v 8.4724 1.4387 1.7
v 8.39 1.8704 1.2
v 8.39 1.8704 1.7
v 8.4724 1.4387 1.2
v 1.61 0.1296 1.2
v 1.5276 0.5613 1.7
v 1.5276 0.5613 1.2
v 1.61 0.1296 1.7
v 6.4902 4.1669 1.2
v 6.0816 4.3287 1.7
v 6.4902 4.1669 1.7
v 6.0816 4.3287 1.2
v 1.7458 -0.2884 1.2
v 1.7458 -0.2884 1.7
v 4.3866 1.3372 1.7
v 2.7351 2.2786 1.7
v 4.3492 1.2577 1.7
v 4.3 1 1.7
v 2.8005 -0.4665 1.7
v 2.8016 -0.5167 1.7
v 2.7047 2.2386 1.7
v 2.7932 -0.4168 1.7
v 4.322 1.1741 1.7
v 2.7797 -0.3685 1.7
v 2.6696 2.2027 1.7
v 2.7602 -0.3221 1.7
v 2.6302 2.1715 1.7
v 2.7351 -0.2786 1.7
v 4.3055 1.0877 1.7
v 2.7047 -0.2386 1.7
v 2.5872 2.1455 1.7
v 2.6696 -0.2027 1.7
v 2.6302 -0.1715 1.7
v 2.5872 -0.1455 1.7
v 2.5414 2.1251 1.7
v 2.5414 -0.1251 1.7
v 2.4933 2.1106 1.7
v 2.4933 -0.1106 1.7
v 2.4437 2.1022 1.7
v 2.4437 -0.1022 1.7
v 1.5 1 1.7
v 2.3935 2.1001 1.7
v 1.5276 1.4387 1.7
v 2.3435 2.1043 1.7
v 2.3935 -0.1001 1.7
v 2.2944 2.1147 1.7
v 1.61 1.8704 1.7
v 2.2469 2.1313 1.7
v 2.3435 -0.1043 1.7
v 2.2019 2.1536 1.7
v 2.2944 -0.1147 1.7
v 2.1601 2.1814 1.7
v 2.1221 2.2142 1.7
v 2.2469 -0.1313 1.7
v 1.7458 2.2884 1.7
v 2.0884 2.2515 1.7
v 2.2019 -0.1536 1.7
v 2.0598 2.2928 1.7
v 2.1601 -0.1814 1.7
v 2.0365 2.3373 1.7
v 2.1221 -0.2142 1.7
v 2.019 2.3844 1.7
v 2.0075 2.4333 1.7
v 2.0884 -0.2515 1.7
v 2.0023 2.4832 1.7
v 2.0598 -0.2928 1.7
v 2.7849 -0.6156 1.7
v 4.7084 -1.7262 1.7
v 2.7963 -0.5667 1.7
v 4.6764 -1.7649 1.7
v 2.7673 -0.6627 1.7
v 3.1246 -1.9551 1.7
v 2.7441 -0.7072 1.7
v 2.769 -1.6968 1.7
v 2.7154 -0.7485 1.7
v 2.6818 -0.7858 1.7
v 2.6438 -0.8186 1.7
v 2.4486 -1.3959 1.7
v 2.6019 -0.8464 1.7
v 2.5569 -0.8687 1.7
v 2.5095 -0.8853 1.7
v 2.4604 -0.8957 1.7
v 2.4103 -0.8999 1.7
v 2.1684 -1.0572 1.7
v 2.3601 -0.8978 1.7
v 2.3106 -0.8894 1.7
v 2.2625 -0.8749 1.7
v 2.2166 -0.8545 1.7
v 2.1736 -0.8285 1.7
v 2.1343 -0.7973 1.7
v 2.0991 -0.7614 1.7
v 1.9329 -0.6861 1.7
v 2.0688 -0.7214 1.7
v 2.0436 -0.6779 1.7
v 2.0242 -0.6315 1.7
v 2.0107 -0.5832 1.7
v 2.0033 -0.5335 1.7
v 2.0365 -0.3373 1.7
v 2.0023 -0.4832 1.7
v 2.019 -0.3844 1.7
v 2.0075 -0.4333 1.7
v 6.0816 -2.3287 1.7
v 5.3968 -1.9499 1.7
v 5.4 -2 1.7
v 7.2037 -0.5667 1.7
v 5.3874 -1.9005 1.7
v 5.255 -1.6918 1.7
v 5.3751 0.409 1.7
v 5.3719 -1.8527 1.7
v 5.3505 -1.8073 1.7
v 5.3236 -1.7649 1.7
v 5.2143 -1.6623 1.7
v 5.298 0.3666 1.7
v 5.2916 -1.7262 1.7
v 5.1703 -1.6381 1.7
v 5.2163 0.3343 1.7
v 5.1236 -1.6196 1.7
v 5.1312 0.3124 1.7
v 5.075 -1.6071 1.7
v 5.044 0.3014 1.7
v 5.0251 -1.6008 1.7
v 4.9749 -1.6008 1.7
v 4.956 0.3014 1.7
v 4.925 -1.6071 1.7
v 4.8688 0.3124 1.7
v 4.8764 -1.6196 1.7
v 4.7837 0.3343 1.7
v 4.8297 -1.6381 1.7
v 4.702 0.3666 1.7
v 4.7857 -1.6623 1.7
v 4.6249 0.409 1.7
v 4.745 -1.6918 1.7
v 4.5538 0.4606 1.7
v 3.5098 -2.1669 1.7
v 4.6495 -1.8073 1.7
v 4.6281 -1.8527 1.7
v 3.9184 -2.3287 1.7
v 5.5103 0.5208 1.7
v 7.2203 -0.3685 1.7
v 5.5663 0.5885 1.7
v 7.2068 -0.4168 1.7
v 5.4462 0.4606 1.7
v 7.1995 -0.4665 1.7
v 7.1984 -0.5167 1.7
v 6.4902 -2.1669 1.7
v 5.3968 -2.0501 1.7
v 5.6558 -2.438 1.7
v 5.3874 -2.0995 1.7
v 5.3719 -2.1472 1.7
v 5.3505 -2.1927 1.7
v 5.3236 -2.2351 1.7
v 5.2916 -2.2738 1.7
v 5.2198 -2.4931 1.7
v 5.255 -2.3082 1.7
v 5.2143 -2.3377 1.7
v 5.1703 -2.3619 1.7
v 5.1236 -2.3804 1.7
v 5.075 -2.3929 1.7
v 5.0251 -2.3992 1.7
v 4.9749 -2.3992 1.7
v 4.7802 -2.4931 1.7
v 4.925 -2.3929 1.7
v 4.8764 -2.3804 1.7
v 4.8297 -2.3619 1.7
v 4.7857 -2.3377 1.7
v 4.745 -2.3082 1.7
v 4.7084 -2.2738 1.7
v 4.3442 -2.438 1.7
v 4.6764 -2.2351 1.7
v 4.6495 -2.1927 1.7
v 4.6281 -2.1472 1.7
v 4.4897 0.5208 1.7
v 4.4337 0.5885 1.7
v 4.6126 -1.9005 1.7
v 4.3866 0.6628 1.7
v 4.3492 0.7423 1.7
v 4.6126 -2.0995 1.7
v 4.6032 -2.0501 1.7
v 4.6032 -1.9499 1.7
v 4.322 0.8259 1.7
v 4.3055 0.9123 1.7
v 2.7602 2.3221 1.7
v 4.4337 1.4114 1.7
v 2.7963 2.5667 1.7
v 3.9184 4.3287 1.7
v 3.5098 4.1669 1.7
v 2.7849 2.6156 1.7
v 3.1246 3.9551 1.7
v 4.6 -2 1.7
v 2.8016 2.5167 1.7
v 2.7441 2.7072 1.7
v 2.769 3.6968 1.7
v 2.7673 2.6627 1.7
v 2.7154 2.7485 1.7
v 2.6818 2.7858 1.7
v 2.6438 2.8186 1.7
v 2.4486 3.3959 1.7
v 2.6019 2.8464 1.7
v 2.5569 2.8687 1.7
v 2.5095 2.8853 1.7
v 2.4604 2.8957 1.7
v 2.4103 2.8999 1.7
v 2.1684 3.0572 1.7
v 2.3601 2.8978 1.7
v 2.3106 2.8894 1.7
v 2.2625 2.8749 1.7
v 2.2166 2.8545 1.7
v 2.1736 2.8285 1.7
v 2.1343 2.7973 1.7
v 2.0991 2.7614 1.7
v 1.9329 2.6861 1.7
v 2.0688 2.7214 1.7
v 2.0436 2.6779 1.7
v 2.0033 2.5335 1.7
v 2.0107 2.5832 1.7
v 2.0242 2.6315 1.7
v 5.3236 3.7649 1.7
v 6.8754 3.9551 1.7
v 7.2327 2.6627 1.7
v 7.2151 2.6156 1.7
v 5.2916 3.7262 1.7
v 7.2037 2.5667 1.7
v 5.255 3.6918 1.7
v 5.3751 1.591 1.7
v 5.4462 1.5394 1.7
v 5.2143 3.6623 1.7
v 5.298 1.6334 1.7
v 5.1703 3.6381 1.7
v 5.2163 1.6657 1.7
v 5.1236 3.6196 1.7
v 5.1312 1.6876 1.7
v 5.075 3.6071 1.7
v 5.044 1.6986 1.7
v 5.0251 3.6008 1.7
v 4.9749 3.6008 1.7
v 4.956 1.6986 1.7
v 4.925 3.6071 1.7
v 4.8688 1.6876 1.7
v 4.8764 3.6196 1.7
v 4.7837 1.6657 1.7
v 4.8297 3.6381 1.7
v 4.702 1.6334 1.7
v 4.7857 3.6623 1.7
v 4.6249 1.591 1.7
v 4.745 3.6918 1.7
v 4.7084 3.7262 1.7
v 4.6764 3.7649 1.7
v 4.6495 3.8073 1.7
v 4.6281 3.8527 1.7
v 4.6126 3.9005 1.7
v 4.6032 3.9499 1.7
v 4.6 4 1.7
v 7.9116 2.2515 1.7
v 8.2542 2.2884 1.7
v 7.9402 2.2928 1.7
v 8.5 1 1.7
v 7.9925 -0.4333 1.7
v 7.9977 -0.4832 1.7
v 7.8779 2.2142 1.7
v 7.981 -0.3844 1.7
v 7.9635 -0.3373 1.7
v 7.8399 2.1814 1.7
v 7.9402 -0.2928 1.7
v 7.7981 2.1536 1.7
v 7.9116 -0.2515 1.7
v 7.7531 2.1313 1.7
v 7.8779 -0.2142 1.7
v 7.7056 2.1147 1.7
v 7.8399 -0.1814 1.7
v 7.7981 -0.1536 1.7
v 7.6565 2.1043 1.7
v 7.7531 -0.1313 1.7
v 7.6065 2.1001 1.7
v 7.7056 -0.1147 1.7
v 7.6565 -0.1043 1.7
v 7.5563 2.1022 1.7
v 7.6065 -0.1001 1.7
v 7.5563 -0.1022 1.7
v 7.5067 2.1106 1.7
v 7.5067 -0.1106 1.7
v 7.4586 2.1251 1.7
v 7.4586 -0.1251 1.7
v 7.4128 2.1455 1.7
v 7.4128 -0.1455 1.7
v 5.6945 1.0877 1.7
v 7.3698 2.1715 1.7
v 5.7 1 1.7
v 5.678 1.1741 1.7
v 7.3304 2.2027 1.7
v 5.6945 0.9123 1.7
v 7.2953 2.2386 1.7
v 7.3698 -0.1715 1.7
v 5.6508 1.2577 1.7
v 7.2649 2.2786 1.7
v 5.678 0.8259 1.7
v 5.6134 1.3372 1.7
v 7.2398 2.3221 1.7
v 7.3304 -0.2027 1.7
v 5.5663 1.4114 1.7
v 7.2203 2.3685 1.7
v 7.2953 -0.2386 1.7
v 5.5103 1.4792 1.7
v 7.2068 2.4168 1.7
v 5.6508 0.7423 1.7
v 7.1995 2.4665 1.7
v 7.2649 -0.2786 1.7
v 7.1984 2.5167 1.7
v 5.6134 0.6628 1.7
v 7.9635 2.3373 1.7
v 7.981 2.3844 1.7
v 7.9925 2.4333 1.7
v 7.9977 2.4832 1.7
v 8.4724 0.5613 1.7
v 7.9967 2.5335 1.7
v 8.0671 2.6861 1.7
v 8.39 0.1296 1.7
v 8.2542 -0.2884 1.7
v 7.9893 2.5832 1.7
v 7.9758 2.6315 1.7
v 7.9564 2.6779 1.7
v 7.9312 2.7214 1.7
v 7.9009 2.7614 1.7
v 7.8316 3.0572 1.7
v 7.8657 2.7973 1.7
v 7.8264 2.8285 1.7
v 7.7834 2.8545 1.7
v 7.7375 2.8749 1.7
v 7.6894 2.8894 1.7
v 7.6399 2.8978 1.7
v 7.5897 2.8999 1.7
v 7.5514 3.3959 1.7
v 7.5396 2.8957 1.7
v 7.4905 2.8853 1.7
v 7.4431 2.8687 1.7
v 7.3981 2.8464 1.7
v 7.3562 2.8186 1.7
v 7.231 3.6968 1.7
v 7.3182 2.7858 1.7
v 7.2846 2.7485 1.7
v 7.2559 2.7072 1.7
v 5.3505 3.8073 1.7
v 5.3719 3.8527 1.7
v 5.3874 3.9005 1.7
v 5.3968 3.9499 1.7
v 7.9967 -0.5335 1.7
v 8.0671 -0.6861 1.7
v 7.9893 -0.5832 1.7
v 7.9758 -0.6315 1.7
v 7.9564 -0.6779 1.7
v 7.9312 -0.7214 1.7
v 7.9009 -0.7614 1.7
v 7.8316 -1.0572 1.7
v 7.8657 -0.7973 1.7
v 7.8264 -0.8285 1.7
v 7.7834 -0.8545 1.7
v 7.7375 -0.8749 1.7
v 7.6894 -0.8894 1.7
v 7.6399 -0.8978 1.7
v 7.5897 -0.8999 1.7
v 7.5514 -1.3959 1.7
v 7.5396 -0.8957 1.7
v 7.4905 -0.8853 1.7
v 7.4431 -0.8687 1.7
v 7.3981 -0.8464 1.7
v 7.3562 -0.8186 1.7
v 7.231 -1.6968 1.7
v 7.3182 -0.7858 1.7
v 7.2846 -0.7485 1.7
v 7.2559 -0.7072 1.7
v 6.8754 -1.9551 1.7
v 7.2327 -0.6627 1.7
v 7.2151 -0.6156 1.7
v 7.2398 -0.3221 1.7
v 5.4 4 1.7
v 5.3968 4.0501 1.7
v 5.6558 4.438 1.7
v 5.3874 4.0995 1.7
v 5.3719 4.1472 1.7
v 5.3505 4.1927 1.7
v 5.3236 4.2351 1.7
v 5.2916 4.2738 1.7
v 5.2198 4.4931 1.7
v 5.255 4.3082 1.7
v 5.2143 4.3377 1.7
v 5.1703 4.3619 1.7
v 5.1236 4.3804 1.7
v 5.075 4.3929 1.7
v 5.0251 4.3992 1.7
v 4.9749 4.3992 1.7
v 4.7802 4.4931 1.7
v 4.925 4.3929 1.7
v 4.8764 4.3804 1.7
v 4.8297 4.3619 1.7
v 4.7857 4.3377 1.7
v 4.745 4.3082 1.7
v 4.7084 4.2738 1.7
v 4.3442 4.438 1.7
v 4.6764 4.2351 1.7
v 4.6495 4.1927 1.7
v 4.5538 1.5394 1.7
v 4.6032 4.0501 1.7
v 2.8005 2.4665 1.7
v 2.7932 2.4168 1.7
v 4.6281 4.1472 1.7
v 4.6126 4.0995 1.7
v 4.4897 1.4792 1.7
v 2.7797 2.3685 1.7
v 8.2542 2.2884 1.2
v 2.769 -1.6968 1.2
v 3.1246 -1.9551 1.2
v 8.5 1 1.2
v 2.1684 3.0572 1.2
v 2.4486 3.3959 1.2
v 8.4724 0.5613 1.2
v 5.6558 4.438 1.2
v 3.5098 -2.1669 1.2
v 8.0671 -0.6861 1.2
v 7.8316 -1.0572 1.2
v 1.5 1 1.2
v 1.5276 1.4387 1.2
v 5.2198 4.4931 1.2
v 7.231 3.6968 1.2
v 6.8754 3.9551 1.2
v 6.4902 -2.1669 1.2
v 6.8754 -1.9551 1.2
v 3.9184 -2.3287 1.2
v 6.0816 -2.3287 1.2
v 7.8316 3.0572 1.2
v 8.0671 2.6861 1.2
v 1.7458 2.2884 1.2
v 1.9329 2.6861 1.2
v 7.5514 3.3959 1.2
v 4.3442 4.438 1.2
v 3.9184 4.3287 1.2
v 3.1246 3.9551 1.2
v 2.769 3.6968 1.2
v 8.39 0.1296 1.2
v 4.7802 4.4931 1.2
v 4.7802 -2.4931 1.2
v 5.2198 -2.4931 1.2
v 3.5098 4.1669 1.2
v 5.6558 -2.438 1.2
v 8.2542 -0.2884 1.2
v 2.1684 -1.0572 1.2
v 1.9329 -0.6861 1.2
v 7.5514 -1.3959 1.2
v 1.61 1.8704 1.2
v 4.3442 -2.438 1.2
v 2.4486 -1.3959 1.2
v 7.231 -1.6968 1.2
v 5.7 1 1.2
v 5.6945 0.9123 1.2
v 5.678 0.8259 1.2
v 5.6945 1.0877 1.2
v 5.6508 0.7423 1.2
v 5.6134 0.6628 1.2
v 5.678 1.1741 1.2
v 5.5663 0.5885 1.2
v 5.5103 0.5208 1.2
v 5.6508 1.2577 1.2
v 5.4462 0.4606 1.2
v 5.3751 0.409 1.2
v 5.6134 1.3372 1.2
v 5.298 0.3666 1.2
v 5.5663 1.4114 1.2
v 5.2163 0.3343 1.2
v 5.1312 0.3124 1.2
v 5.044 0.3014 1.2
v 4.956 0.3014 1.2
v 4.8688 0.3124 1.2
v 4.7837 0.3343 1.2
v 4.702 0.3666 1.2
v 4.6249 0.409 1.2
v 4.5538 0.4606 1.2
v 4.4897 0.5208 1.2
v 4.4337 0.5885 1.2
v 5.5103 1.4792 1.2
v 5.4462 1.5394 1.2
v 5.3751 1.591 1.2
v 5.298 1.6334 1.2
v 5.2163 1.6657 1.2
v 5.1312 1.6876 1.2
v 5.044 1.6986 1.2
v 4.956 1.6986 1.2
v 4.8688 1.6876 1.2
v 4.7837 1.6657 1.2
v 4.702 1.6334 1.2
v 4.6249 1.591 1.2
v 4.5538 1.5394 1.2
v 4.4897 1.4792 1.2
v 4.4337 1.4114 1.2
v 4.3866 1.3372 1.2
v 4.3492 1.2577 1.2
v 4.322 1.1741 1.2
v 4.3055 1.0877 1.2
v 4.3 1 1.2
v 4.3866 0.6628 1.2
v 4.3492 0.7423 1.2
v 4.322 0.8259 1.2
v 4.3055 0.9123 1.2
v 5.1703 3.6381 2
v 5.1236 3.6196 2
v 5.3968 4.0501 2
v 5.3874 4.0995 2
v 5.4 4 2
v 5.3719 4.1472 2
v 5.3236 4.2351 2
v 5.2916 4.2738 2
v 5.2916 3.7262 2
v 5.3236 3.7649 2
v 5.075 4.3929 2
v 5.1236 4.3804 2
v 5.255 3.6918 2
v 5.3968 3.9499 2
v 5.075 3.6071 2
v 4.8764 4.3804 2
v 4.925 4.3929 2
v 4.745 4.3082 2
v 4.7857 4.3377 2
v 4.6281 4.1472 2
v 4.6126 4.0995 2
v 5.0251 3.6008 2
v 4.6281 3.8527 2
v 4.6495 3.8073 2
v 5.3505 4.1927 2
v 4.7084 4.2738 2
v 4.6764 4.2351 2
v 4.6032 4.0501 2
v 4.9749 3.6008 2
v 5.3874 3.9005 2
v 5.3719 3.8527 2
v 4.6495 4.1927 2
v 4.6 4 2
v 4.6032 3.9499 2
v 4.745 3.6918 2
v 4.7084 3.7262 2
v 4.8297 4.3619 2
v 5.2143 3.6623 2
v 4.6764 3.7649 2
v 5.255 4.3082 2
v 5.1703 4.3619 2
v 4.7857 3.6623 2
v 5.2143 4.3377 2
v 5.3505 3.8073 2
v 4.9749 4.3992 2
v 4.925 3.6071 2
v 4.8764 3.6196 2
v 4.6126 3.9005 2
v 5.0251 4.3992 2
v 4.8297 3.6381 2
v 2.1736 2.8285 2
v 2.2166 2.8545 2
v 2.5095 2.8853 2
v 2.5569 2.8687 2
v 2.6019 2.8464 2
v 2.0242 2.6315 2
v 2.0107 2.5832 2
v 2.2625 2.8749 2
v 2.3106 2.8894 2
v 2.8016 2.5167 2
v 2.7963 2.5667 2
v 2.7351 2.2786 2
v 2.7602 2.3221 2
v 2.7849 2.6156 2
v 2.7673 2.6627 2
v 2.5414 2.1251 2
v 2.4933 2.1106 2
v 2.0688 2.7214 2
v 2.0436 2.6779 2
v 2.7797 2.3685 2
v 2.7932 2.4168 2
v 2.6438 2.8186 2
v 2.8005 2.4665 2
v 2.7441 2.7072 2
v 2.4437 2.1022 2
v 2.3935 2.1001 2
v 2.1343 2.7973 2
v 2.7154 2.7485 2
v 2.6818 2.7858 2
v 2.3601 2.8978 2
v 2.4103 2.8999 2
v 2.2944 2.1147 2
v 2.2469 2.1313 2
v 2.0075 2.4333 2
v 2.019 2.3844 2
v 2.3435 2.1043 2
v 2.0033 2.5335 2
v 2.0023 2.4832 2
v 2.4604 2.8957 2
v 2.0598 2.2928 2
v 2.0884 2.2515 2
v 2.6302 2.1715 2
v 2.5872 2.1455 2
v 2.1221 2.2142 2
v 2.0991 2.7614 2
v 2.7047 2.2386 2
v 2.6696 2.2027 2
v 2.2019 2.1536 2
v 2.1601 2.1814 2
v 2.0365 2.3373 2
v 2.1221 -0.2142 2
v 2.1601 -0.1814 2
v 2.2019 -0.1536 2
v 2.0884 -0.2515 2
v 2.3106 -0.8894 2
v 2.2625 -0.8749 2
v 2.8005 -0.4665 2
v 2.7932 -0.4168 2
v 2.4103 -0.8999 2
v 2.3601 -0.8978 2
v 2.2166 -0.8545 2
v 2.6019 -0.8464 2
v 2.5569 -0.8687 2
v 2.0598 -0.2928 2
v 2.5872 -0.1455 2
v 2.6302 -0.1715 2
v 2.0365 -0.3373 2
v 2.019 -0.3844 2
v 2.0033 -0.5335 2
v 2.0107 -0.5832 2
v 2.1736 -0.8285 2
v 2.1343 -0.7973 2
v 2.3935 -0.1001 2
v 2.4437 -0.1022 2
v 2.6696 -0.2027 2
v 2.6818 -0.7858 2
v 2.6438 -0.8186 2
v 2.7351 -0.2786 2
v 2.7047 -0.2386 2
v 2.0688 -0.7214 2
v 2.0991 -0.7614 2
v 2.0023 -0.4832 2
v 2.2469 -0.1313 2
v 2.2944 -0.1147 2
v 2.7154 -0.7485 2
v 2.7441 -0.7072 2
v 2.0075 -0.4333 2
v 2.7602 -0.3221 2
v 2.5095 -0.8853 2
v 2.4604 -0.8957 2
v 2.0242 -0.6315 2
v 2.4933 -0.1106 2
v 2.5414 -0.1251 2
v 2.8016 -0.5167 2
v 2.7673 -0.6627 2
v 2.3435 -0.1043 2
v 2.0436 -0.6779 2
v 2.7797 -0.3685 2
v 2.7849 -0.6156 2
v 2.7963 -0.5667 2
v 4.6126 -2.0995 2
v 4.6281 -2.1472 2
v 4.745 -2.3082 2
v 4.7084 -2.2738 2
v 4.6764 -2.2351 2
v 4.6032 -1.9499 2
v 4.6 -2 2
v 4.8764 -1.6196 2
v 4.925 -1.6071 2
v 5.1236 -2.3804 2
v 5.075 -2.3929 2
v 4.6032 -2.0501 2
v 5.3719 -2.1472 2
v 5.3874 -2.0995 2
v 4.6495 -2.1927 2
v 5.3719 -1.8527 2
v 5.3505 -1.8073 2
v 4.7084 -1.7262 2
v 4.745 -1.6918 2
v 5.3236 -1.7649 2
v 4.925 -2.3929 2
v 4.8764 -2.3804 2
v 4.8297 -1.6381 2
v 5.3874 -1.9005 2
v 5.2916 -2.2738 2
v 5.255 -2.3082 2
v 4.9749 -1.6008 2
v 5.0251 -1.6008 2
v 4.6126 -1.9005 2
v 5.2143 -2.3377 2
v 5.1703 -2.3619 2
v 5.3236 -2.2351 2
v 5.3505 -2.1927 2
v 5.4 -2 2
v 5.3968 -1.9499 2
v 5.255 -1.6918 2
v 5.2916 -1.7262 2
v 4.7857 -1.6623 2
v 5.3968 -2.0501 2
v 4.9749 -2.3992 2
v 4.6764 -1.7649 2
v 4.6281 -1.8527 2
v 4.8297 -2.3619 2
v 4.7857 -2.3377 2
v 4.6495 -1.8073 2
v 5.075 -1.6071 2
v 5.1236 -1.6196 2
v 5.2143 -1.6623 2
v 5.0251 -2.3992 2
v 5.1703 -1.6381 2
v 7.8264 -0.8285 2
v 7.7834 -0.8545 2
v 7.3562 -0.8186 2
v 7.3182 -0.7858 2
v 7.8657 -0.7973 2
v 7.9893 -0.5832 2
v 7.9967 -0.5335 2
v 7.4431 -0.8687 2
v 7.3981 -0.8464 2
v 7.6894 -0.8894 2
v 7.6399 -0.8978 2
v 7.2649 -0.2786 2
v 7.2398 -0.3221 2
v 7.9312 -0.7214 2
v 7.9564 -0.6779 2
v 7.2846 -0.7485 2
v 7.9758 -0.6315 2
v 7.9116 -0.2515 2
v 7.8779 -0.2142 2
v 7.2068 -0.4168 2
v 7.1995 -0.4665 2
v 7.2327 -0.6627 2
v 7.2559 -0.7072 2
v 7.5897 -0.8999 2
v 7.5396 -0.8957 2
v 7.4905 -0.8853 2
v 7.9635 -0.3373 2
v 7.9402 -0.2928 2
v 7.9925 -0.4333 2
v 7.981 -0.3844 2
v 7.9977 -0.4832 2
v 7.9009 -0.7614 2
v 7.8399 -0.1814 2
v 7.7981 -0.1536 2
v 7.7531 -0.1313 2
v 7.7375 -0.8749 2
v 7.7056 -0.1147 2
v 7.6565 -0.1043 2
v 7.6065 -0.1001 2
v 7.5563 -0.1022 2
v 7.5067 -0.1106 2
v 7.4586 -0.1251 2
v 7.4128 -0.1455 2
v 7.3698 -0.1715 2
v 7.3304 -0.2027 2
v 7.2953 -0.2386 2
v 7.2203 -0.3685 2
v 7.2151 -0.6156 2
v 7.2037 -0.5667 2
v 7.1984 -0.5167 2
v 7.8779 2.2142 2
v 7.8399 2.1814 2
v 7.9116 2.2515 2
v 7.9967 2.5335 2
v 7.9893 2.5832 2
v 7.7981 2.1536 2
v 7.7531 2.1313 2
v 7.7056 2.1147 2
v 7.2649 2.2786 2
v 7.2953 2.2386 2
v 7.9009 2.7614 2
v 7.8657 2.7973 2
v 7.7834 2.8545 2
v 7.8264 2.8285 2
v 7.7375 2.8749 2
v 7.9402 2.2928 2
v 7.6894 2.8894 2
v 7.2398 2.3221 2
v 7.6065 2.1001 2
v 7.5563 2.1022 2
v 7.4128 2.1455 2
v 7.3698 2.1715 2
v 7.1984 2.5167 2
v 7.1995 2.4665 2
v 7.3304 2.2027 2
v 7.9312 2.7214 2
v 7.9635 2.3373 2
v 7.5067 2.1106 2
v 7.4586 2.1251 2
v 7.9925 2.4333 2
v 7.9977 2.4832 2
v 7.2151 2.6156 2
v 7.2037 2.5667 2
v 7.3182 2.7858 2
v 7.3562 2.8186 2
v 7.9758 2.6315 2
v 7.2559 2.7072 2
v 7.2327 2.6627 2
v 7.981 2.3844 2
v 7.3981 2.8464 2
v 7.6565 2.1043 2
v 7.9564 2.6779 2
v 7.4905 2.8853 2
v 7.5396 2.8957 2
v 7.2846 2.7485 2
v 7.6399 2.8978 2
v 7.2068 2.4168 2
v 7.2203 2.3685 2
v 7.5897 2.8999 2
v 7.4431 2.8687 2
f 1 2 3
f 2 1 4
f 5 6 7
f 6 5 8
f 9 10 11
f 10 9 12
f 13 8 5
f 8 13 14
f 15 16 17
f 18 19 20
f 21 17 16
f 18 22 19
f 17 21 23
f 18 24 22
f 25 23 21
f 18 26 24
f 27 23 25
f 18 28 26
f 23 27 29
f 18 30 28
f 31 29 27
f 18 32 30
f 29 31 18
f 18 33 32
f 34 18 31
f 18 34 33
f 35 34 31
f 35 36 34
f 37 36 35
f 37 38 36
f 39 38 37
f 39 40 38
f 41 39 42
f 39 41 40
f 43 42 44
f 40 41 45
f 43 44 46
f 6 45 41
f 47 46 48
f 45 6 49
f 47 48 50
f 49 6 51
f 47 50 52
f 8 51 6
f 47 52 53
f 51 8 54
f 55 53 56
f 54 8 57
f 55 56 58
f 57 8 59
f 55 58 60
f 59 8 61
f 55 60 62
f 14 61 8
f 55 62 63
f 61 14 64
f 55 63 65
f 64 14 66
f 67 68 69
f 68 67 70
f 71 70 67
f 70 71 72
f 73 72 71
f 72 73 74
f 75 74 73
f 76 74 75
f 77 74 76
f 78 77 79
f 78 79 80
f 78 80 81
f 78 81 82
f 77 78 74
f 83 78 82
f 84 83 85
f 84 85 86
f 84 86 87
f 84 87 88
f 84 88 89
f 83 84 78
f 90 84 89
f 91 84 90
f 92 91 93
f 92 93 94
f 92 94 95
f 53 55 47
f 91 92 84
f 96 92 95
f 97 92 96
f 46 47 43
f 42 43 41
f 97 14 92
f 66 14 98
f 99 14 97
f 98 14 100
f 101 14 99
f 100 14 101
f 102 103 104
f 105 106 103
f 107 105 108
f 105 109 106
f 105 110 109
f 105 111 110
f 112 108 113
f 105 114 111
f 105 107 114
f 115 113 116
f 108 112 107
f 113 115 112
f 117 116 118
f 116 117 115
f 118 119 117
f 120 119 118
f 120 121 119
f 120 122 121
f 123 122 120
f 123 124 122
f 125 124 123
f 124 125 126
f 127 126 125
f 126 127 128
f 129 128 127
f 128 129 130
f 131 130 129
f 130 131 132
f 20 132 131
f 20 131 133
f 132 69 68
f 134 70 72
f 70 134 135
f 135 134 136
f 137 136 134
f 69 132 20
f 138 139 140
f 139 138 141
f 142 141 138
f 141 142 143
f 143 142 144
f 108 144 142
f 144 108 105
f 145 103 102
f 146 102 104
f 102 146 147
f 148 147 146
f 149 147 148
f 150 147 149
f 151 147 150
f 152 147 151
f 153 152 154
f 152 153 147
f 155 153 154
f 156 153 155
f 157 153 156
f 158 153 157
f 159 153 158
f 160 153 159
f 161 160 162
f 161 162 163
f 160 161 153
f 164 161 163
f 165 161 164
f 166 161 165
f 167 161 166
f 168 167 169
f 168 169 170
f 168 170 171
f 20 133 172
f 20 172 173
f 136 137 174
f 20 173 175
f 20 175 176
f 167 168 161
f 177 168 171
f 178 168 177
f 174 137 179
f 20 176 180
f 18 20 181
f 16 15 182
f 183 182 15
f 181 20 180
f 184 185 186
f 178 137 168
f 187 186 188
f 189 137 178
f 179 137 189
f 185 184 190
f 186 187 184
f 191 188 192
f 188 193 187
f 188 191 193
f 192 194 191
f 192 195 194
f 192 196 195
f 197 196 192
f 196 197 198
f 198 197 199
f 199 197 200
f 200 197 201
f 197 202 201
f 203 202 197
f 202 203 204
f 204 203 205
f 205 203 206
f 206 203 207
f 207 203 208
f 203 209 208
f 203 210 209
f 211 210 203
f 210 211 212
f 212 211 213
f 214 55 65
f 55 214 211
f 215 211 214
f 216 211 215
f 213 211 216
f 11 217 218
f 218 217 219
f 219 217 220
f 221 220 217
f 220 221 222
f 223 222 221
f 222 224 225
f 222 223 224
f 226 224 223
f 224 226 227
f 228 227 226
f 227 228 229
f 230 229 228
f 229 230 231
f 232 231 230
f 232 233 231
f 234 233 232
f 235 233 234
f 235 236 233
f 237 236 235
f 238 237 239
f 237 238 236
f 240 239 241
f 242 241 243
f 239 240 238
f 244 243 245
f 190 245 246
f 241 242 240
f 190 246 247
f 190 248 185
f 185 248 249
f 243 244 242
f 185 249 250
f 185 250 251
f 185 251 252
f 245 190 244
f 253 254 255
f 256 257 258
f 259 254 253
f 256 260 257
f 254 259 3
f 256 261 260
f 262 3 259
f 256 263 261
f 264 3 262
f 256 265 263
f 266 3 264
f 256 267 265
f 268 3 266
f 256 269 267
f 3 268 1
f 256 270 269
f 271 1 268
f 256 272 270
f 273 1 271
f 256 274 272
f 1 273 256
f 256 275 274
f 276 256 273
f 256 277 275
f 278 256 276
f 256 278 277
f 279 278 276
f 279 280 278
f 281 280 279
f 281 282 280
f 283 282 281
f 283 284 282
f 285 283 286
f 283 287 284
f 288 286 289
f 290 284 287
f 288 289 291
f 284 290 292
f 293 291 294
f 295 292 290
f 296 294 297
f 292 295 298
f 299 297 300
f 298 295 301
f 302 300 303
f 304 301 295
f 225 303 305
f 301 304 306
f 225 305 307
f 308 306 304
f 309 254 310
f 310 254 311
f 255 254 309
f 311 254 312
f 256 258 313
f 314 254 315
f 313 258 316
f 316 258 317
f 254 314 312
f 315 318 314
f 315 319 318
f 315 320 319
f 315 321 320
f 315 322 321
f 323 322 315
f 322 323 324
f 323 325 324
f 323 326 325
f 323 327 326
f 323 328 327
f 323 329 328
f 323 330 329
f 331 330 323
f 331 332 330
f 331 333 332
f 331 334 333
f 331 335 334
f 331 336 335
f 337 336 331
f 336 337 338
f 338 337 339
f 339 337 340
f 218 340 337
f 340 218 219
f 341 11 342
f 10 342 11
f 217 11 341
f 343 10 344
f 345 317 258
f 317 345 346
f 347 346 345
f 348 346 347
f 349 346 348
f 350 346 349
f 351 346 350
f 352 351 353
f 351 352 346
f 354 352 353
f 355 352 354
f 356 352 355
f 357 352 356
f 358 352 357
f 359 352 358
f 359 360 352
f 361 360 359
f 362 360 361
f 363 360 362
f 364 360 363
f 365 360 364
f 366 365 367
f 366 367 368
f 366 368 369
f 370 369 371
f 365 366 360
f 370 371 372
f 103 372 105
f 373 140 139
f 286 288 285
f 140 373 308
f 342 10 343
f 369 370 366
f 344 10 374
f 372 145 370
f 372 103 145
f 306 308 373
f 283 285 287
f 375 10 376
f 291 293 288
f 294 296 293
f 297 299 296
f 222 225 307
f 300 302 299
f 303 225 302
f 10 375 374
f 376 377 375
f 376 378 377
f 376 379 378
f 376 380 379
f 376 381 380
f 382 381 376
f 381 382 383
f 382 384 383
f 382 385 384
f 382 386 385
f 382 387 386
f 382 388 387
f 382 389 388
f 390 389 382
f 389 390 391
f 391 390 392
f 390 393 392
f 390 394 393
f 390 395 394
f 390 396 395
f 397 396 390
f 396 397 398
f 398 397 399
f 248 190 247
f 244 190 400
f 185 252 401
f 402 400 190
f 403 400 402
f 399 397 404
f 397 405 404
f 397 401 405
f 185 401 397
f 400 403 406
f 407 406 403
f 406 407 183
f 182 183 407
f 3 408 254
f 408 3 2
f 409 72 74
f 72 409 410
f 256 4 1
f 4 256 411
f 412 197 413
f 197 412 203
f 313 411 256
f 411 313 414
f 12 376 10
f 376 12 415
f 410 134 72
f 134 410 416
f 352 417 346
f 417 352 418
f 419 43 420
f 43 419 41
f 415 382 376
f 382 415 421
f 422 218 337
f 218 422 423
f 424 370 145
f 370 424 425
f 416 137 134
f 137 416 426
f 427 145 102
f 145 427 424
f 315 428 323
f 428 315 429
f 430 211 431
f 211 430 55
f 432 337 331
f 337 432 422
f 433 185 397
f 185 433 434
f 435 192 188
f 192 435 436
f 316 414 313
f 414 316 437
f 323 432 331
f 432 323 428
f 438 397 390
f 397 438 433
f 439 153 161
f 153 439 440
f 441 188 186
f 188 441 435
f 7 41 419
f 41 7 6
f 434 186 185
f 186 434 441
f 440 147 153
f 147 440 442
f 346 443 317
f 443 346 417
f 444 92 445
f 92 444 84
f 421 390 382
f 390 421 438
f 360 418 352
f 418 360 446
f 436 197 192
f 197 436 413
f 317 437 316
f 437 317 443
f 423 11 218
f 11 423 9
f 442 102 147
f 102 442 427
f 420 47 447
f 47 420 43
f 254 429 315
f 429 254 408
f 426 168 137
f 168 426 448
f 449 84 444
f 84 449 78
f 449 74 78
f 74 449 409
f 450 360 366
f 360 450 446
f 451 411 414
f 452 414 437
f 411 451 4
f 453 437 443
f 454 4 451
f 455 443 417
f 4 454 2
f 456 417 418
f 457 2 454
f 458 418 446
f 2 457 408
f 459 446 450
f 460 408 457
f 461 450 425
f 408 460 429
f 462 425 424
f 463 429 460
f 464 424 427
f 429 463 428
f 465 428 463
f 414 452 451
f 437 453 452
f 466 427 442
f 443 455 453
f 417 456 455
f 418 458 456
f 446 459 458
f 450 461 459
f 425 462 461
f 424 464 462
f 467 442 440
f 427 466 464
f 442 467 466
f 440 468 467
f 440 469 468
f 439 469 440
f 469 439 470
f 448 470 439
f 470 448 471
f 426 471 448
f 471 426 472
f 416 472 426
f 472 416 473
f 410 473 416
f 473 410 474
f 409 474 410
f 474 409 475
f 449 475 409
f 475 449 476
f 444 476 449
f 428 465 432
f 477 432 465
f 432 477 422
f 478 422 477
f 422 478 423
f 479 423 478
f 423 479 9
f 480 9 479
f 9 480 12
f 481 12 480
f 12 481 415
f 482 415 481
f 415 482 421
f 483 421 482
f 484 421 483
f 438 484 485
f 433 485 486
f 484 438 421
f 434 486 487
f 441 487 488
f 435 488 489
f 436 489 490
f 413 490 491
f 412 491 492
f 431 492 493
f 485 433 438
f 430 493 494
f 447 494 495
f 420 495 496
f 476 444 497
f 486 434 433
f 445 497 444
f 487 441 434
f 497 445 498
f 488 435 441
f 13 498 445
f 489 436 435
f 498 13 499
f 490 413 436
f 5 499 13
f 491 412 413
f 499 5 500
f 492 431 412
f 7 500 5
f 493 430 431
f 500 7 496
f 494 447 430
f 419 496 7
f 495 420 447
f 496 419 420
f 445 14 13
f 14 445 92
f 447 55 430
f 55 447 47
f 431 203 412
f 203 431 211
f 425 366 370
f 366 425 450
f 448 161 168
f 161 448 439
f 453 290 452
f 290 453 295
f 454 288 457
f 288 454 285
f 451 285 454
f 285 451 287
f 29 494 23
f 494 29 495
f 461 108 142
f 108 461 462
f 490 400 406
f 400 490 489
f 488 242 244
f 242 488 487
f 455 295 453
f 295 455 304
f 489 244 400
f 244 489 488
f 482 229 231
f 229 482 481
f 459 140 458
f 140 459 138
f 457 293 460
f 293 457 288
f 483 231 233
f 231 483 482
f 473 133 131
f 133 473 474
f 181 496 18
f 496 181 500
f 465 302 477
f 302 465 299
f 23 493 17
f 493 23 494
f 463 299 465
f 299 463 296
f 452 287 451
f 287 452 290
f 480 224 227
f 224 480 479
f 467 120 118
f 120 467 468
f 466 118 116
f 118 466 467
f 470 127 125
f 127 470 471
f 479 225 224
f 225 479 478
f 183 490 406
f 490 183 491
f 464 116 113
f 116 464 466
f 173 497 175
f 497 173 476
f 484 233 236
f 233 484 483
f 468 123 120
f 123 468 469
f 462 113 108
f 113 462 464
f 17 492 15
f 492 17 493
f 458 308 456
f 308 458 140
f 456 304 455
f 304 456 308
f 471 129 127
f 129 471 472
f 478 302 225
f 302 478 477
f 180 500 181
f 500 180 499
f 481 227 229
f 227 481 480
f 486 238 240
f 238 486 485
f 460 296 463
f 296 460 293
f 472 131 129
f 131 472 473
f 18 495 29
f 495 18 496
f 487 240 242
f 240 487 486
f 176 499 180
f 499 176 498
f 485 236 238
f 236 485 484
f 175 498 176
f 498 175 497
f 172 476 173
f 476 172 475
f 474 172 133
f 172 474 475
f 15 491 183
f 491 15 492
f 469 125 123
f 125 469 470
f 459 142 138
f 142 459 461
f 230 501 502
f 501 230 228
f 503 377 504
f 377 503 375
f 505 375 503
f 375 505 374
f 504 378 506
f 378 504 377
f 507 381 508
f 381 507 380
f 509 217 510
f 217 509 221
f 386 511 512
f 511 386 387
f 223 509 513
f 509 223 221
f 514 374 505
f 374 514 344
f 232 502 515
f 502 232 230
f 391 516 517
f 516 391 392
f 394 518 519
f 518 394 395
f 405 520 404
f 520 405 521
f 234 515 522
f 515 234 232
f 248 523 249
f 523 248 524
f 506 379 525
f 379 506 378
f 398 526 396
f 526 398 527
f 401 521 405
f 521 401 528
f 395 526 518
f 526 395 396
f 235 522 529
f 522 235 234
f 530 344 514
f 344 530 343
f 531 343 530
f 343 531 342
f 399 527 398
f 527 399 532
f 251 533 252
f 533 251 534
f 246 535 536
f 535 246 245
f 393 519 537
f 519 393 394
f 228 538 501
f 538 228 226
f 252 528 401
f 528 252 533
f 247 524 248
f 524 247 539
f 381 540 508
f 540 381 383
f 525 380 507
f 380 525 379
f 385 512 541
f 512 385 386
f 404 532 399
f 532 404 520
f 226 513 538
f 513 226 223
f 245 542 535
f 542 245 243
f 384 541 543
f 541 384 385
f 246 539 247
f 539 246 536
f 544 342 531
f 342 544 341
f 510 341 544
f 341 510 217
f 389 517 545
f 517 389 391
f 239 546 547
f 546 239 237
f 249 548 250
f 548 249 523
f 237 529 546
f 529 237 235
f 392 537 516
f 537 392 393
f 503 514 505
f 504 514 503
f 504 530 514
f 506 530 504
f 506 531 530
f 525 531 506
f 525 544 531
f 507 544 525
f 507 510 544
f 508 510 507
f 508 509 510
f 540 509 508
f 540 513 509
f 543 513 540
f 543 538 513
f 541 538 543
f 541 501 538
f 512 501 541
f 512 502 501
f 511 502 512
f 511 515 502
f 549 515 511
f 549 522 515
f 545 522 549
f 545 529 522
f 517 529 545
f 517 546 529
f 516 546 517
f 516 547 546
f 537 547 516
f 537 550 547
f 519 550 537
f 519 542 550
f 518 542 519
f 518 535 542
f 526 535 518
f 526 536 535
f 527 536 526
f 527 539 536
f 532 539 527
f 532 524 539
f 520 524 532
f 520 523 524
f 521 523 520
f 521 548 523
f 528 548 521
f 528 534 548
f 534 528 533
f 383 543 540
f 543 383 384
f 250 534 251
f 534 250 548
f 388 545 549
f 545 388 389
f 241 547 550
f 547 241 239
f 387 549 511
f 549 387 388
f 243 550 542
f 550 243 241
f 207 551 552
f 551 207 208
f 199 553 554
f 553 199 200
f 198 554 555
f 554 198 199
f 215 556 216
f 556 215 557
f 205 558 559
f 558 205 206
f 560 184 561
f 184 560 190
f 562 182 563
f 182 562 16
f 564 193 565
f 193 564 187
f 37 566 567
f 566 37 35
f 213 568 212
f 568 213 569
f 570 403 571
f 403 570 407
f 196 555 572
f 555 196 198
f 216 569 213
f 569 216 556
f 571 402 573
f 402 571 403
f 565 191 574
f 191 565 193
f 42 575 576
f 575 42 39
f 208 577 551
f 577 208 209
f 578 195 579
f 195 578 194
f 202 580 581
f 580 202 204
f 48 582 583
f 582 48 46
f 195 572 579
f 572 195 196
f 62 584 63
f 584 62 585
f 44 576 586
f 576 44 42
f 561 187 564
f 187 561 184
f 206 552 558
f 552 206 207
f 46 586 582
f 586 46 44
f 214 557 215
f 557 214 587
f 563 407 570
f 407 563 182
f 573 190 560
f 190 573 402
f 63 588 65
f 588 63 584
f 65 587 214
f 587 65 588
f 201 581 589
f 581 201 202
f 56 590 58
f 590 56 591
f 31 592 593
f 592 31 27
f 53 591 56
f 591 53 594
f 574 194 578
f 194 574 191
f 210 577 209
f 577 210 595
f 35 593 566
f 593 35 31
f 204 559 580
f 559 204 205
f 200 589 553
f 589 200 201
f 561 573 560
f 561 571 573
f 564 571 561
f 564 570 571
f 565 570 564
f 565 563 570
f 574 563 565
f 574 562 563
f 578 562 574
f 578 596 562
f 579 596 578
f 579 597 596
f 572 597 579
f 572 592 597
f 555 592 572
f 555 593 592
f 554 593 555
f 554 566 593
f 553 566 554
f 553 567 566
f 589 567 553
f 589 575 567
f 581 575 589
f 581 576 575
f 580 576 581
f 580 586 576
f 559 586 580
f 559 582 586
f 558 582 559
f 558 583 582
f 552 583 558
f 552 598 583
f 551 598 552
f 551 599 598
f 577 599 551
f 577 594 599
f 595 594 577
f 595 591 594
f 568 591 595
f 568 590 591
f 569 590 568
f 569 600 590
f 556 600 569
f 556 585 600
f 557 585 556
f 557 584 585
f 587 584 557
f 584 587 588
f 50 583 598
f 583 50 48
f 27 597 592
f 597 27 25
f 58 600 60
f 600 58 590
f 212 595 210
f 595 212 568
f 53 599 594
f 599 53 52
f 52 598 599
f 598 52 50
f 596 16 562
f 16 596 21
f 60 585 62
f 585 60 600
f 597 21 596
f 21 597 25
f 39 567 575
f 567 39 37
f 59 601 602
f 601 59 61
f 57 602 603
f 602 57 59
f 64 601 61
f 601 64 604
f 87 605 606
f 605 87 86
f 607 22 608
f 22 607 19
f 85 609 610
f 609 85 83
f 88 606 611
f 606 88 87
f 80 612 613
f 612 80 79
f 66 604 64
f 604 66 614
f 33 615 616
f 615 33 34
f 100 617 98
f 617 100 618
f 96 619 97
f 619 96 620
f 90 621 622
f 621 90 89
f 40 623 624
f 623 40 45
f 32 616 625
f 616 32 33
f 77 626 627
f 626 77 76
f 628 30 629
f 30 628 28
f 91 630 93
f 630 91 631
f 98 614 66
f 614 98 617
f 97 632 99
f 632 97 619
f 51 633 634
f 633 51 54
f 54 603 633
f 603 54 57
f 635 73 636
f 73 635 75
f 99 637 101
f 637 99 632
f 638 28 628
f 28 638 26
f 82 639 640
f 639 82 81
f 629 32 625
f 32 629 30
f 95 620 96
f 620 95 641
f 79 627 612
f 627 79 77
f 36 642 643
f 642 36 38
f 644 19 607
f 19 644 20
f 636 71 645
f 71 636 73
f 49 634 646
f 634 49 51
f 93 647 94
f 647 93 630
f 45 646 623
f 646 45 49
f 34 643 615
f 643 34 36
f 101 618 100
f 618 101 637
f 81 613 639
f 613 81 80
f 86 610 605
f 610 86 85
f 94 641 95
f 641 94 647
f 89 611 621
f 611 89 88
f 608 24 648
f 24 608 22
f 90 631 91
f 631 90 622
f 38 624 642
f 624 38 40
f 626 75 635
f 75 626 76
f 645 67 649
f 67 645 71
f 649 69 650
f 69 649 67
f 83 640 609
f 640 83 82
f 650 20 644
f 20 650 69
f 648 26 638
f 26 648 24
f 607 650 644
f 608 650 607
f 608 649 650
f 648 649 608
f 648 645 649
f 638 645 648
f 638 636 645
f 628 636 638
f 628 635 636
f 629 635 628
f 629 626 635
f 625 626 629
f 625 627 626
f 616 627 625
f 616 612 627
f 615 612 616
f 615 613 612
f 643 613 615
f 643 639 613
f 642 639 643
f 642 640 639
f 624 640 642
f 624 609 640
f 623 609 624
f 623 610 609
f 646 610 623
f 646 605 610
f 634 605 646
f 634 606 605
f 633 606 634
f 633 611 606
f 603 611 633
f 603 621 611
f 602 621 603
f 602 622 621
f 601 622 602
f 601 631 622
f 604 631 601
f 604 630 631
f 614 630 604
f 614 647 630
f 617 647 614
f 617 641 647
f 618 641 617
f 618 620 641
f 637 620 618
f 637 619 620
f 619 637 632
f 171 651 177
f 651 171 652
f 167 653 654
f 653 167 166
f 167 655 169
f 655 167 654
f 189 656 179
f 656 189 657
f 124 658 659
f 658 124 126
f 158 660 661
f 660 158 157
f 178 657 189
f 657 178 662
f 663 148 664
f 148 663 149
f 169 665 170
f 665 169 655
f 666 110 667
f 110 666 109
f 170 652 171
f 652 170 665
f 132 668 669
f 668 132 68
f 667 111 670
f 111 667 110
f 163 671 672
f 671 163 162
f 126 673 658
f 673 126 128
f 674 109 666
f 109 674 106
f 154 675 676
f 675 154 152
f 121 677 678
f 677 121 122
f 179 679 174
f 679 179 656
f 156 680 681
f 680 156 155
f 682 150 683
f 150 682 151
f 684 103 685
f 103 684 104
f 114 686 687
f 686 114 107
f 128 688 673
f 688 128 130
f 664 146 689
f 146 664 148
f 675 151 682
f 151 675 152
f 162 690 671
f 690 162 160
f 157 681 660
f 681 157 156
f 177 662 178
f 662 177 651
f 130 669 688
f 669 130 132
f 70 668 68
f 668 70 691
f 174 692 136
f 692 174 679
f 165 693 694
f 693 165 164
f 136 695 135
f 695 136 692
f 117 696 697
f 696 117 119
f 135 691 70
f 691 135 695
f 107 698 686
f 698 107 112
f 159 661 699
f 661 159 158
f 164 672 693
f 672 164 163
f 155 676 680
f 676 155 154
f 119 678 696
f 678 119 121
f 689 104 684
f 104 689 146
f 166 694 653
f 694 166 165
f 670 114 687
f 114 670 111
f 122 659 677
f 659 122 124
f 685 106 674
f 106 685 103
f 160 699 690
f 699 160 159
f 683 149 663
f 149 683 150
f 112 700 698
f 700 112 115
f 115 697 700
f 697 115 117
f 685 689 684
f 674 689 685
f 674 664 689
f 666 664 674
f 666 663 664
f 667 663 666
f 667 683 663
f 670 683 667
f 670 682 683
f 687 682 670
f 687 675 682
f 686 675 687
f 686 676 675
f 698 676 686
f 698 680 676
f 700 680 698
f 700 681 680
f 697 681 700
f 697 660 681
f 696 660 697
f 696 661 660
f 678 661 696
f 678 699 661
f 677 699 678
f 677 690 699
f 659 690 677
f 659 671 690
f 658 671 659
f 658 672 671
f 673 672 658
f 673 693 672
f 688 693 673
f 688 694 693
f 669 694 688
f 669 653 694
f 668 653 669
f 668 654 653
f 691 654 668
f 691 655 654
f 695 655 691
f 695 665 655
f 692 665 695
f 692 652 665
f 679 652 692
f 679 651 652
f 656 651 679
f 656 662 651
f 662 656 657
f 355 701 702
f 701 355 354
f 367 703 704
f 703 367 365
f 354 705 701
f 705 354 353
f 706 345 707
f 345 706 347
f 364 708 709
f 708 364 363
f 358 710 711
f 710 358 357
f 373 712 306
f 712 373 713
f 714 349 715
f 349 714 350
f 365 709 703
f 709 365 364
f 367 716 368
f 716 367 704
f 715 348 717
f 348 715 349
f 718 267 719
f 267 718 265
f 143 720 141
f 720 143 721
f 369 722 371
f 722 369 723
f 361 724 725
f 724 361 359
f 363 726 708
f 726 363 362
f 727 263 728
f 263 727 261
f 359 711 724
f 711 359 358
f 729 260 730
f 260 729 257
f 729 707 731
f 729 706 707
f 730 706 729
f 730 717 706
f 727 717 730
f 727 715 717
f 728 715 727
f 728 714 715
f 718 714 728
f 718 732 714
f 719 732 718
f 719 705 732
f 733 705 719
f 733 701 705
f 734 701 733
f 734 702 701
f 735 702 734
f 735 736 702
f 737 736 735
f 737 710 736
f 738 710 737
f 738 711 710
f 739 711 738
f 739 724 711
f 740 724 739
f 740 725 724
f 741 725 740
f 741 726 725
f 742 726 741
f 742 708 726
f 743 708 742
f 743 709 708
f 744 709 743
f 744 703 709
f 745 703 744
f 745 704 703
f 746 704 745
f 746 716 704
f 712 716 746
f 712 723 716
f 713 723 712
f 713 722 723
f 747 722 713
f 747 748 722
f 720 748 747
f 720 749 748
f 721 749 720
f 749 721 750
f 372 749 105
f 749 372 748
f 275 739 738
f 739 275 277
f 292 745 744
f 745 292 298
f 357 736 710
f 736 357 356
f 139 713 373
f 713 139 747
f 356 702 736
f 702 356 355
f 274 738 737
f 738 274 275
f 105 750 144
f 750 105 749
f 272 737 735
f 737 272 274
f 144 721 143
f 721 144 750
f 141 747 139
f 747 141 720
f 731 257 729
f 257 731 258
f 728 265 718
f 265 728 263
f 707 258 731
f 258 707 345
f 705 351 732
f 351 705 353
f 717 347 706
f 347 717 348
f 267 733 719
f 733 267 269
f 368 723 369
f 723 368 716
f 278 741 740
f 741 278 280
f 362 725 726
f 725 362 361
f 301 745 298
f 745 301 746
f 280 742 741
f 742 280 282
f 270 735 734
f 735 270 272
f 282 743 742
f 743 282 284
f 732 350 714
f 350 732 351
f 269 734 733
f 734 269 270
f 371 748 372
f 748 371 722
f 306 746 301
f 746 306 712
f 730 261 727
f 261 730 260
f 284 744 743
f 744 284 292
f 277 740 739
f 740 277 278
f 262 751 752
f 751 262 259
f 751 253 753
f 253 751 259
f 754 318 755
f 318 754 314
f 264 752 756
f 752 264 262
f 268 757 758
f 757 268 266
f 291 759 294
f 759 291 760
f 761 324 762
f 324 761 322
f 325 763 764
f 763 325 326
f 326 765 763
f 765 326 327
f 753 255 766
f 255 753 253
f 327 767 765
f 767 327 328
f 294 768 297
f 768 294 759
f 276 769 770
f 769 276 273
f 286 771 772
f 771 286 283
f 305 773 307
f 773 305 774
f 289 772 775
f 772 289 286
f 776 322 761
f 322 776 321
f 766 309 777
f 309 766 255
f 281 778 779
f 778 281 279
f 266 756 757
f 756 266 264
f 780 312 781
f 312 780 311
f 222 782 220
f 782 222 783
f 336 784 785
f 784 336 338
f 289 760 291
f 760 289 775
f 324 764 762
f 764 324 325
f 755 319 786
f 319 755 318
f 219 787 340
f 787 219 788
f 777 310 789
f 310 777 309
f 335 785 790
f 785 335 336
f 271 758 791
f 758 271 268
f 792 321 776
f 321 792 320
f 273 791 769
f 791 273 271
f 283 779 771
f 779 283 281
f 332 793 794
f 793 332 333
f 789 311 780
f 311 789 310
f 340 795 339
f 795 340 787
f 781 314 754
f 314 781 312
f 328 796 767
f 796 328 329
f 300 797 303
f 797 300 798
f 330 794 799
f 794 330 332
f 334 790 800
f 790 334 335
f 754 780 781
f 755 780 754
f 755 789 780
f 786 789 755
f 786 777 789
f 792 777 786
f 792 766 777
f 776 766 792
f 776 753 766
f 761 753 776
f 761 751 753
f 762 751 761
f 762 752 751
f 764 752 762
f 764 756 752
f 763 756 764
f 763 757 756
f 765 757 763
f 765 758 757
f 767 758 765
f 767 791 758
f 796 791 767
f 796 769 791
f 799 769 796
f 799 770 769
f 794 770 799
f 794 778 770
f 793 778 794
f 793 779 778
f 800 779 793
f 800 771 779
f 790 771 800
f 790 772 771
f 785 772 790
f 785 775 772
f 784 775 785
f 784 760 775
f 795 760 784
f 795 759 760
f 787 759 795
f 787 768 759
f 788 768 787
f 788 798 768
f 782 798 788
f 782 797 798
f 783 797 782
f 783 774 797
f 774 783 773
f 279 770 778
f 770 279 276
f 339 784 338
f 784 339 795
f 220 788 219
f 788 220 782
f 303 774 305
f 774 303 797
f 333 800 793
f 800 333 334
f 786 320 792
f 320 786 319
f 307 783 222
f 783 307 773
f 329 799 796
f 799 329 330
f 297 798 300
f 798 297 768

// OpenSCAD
module inner(){
 	translate([1,1,0])
 		cube([6,7,1]);
 	cube([8,6,1]);
 }
 
 module box(){
 	difference(){
 		cube([10,4,3]);
 
 		translate([1,-1,1])
 			inner();
 	}
 	
 	translate([5,1,0])
 		cylinder(r=0.5, h=3, $fn=50);
 }
 
 module roller(){
 	difference(){
 		color("red")
 			translate([5,1,1.2])
 			cylinder(r=3.5, h=0.5, $fn=50);
 
 		translate([5,1,1])
 			cylinder(r=0.7, h=1, $fn=50);
 	}
 }
 
 module vex(){
 	translate([5, 1, 1.5])
 		for( i = [0:5] ){
 
 			rotate(i*360/6, [0,0,1])
 			translate([0, 3, 0])
 			cylinder(r=0.4, h=0.5, $fn=50);
 	}
 }
 
 % box();
 roller();
 vex();
